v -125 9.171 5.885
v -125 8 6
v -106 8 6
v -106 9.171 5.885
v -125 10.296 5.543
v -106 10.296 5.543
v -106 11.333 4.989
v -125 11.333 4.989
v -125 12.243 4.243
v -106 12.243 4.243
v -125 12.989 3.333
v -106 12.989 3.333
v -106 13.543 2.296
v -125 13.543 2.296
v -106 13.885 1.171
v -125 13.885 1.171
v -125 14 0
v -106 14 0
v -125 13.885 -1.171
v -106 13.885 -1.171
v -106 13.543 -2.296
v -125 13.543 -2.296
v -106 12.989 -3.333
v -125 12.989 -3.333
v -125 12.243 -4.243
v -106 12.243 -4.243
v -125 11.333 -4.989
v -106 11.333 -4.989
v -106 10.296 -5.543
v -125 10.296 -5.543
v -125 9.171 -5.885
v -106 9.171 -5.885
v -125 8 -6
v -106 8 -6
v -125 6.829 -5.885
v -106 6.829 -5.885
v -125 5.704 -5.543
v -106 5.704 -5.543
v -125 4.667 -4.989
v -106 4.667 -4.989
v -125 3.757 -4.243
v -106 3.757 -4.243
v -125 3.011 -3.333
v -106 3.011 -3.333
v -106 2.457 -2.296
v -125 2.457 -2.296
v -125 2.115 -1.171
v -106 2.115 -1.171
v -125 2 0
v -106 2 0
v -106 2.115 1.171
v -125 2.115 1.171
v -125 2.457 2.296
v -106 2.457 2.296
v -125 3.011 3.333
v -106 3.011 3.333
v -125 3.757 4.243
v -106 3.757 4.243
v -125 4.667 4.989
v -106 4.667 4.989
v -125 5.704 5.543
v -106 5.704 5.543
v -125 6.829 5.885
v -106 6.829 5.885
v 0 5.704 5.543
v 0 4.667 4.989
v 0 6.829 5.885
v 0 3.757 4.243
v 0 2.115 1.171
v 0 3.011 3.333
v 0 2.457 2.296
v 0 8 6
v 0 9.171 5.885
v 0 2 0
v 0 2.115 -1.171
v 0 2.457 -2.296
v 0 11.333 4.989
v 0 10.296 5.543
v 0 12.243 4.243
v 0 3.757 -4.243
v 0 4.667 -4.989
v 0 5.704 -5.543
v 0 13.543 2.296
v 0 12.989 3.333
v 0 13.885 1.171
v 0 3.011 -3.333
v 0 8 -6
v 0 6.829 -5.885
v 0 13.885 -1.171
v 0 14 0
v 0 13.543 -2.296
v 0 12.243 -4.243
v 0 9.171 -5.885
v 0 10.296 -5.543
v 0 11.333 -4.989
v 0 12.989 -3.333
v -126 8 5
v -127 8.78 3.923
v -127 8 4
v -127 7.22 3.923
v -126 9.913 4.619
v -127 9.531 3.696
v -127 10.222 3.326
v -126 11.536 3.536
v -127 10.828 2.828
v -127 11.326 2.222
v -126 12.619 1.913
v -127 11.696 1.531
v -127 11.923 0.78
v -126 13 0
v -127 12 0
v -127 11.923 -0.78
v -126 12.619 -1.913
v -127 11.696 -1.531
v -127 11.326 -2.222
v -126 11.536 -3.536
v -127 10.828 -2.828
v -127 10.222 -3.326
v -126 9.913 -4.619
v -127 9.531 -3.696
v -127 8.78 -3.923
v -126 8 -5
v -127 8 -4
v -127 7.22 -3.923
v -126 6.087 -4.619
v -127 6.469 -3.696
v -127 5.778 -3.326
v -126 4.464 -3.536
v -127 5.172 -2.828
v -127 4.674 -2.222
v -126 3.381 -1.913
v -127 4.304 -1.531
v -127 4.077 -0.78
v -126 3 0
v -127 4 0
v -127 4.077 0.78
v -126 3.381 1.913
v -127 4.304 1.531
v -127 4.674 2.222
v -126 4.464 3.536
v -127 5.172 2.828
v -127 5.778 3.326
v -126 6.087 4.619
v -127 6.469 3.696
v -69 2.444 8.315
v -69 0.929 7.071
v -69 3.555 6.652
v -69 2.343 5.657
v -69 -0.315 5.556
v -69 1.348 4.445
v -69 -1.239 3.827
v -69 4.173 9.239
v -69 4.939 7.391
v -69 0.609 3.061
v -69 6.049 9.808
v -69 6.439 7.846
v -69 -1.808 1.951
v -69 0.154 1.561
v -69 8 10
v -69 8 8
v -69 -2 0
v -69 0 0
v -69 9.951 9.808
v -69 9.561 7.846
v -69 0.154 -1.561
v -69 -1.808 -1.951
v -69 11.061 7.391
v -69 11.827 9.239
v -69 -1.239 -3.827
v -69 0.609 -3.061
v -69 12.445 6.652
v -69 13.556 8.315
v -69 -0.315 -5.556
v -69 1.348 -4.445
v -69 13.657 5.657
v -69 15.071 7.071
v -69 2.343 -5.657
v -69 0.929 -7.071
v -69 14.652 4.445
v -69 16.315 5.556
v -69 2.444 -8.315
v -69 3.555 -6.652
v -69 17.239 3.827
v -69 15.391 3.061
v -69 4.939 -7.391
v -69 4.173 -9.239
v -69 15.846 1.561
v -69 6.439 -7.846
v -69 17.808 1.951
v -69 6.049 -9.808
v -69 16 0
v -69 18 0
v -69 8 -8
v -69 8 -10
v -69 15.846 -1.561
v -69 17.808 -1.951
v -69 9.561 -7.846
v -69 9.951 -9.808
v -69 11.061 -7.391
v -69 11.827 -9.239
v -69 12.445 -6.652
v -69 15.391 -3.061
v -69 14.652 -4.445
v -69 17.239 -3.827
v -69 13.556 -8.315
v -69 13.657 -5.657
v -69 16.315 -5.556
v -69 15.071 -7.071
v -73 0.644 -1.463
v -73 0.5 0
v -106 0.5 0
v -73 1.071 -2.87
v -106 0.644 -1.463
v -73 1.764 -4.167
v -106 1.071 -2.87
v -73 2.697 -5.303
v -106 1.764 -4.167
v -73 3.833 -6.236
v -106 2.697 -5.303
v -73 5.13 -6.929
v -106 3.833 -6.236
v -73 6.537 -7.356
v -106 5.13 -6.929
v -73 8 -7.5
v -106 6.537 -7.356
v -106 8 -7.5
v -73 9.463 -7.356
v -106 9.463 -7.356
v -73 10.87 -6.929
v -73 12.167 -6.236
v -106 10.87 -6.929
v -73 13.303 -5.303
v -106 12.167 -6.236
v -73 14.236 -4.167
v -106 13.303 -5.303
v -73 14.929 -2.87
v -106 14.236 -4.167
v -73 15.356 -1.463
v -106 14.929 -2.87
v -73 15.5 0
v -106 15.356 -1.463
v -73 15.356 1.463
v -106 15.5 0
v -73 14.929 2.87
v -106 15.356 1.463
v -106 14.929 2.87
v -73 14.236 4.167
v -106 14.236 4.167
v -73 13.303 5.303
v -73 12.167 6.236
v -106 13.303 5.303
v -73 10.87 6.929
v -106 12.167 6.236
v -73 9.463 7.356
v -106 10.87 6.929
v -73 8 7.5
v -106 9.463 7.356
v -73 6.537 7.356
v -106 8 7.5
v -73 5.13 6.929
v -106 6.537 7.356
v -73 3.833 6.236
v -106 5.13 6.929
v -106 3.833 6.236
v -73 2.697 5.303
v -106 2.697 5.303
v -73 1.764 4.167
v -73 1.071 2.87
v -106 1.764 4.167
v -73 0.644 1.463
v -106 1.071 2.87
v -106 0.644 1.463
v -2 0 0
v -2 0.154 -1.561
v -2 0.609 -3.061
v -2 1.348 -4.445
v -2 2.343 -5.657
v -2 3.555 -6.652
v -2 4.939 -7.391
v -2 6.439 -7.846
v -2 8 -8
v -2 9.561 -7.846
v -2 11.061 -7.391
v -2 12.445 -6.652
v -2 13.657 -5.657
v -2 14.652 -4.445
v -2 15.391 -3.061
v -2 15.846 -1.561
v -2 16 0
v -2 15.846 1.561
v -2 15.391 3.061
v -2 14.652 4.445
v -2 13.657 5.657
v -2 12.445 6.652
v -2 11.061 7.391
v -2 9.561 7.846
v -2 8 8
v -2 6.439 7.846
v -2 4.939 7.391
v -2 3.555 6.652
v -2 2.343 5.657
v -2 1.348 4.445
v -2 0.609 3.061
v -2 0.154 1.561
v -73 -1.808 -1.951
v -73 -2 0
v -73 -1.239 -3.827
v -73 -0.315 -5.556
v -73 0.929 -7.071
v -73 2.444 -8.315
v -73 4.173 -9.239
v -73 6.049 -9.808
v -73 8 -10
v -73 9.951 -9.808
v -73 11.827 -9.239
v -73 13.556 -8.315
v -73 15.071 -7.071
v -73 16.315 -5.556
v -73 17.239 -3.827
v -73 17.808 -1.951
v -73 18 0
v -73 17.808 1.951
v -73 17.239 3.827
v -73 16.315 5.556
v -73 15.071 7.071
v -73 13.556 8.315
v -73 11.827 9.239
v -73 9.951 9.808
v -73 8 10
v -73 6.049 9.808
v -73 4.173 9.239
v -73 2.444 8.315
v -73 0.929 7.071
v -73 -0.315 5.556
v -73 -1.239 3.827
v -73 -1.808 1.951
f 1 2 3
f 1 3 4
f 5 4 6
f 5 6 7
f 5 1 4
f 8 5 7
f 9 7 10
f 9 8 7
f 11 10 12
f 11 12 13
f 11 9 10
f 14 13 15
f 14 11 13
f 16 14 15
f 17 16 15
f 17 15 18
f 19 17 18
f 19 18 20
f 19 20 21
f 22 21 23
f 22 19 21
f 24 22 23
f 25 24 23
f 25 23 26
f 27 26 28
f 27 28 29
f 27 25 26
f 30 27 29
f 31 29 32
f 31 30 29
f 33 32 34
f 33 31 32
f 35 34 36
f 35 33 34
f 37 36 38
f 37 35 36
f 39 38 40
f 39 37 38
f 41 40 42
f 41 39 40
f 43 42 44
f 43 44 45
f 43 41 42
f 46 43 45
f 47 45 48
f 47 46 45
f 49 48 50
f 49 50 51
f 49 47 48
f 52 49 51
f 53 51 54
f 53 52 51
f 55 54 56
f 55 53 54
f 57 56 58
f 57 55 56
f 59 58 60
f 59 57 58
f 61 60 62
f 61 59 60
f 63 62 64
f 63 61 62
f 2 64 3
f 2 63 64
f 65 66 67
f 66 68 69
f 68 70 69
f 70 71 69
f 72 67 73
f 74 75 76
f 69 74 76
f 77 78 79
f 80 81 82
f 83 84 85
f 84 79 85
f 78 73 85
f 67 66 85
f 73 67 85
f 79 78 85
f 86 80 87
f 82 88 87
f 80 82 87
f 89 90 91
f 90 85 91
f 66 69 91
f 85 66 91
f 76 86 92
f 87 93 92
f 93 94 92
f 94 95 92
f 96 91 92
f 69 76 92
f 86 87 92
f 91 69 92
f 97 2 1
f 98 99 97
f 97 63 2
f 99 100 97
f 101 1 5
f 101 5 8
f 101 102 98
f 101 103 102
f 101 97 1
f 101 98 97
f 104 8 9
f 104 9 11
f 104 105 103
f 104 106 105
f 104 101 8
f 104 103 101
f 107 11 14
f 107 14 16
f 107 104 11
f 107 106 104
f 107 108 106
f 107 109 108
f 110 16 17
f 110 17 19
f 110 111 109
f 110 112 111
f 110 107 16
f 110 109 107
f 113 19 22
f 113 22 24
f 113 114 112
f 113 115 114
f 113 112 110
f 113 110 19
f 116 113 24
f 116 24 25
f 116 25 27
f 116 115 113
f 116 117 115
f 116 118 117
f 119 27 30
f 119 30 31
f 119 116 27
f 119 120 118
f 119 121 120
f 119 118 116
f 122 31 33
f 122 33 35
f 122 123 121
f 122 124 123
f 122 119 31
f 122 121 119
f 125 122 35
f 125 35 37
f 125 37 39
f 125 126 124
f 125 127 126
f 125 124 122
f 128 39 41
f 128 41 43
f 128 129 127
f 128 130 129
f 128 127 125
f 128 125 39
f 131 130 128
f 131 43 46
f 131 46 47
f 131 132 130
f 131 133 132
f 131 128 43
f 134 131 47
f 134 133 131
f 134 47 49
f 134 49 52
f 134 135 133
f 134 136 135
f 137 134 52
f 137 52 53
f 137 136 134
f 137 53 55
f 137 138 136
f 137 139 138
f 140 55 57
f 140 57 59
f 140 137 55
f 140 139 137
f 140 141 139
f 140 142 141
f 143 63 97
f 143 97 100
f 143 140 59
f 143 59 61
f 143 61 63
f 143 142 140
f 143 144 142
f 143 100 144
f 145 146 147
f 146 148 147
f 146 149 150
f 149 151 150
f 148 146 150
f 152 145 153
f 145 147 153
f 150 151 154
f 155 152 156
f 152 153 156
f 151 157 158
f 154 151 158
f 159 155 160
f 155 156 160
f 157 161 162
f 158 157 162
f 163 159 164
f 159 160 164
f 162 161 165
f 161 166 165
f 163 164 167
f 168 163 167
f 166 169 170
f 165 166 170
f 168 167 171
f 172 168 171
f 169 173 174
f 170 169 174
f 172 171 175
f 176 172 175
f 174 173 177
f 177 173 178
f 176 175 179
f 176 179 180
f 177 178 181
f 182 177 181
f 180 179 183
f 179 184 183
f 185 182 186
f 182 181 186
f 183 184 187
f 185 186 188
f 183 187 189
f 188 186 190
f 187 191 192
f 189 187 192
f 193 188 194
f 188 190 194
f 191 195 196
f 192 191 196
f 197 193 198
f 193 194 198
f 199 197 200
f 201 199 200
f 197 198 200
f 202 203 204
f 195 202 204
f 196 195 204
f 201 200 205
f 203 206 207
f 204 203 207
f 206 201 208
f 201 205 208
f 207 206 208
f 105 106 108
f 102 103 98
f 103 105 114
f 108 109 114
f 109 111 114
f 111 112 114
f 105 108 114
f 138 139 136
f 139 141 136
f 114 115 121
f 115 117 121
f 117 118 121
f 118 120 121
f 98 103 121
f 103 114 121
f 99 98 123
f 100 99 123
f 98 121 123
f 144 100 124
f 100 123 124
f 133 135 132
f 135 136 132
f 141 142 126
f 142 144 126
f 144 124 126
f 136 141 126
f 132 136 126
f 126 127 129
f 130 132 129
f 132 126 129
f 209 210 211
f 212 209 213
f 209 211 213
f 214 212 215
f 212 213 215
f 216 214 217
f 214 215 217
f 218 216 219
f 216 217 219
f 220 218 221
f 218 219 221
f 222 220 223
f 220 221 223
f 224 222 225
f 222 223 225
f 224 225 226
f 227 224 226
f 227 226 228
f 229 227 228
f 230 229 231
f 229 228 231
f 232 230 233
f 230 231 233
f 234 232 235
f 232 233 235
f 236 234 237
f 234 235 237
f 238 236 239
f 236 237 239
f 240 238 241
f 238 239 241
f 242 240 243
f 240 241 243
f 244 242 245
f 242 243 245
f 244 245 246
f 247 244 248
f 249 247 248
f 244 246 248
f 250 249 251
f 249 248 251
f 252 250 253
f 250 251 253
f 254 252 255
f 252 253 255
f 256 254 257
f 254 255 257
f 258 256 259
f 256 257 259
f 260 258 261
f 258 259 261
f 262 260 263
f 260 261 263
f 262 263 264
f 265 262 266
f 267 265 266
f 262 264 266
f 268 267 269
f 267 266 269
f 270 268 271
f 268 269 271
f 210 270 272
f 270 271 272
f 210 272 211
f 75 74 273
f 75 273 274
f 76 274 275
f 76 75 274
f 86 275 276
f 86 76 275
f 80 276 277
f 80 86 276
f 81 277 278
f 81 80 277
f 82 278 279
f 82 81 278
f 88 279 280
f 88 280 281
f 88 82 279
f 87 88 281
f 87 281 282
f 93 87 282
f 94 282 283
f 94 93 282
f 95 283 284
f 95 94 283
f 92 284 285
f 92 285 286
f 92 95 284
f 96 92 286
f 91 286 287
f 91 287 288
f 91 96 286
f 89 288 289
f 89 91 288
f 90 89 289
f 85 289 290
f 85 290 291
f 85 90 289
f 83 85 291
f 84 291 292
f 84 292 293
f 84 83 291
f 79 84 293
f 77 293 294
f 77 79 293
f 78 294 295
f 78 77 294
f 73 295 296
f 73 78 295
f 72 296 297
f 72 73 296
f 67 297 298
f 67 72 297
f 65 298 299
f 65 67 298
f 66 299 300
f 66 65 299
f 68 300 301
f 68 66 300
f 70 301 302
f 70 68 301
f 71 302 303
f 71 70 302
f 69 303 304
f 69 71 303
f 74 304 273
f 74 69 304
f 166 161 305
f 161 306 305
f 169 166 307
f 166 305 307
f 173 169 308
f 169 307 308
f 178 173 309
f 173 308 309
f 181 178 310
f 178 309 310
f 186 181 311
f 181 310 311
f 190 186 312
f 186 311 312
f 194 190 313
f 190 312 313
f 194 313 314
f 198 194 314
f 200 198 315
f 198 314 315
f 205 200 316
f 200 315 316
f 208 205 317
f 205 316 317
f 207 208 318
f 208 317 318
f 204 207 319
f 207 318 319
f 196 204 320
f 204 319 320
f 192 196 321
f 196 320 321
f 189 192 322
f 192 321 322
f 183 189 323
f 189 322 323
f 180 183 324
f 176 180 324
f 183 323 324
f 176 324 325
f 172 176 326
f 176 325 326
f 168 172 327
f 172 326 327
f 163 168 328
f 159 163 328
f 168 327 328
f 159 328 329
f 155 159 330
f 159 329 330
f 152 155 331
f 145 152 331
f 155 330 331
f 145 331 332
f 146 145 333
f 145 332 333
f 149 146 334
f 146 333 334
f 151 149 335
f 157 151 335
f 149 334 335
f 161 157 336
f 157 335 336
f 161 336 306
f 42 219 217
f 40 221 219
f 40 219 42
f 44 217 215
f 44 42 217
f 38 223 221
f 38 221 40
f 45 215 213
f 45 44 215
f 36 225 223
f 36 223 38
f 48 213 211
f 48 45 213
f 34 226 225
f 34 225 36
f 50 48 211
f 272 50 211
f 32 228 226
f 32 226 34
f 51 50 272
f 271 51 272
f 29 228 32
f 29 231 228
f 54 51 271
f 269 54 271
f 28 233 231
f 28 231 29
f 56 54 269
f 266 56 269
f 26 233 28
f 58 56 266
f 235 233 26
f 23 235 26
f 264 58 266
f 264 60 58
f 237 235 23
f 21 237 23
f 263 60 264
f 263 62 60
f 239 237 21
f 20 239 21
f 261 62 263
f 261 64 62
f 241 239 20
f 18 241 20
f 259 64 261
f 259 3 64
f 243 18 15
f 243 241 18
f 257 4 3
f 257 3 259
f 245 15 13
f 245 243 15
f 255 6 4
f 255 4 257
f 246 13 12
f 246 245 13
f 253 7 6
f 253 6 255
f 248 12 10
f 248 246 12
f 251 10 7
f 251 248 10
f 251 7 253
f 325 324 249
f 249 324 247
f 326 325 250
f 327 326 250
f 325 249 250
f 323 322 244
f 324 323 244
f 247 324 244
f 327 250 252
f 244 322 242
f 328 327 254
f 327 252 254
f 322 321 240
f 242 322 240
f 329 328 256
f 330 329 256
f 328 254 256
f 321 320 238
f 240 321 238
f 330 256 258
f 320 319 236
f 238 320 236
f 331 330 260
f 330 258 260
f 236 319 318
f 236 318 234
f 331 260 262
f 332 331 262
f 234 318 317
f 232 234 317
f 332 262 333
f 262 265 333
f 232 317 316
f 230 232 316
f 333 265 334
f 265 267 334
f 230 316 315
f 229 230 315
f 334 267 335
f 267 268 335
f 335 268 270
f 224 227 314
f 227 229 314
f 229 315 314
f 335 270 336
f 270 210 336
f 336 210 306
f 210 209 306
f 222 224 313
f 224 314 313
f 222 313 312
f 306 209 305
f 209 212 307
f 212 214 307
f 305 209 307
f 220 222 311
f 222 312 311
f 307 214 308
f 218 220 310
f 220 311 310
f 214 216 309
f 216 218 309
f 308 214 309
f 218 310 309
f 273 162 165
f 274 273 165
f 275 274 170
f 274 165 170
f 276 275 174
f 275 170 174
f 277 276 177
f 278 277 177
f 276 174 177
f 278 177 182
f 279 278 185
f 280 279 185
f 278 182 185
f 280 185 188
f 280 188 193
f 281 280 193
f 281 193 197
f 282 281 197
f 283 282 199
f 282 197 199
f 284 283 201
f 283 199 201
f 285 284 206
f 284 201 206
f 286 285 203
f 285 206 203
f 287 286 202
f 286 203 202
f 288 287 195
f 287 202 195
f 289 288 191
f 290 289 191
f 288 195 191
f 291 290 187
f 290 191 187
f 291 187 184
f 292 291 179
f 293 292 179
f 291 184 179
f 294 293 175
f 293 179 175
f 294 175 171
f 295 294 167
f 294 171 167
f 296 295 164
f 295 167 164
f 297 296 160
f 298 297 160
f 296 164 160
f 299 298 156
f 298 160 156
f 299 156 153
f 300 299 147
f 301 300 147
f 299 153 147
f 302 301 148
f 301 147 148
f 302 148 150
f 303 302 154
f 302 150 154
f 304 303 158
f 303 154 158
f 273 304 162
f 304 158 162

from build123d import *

# Parameters (mm, degrees)
SKIZZE2_R                       = 7.5
SKIZZE2_R_2                     = 6
SCHNITT_LINEAR_AUSTRAGEN2_DEPTH = 21
FASE2_SIZE                      = 2
FASE3_SIZE                      = 2


with BuildPart() as part:
    # Skizze1 → Rotation1 (revolve)
    with BuildSketch(Plane.XY):
        Polygon((0, 0), (-69, 0), (-69, -2), (-73, -2), (-73, 0.5), (-127, 0.5), (-127, 8), (0, 8), align=None)
    revolve(axis=Axis((-127, 8, 0), (1, 0, 0)))

    # Skizze2 → Schnitt-Linear austragen2 (cut)
    with BuildSketch(Plane.ZY.offset(127)):
        with Locations((0, 8)):
            Circle(SKIZZE2_R)
        with Locations((0, 8)):
            Circle(SKIZZE2_R_2, mode=Mode.SUBTRACT)
    extrude(amount=-SCHNITT_LINEAR_AUSTRAGEN2_DEPTH, mode=Mode.SUBTRACT)

    # Fase2
    fase2_edges = [part.edges().sort_by_distance(p)[0] for p in [
        (-127, 8, -6),
    ]]
    chamfer(fase2_edges, length=FASE2_SIZE)

    # Fase3
    fase3_edges = [part.edges().sort_by_distance(p)[0] for p in [
        (0, 16, 0),
    ]]
    chamfer(fase3_edges, length=FASE3_SIZE)


solid = part.part
